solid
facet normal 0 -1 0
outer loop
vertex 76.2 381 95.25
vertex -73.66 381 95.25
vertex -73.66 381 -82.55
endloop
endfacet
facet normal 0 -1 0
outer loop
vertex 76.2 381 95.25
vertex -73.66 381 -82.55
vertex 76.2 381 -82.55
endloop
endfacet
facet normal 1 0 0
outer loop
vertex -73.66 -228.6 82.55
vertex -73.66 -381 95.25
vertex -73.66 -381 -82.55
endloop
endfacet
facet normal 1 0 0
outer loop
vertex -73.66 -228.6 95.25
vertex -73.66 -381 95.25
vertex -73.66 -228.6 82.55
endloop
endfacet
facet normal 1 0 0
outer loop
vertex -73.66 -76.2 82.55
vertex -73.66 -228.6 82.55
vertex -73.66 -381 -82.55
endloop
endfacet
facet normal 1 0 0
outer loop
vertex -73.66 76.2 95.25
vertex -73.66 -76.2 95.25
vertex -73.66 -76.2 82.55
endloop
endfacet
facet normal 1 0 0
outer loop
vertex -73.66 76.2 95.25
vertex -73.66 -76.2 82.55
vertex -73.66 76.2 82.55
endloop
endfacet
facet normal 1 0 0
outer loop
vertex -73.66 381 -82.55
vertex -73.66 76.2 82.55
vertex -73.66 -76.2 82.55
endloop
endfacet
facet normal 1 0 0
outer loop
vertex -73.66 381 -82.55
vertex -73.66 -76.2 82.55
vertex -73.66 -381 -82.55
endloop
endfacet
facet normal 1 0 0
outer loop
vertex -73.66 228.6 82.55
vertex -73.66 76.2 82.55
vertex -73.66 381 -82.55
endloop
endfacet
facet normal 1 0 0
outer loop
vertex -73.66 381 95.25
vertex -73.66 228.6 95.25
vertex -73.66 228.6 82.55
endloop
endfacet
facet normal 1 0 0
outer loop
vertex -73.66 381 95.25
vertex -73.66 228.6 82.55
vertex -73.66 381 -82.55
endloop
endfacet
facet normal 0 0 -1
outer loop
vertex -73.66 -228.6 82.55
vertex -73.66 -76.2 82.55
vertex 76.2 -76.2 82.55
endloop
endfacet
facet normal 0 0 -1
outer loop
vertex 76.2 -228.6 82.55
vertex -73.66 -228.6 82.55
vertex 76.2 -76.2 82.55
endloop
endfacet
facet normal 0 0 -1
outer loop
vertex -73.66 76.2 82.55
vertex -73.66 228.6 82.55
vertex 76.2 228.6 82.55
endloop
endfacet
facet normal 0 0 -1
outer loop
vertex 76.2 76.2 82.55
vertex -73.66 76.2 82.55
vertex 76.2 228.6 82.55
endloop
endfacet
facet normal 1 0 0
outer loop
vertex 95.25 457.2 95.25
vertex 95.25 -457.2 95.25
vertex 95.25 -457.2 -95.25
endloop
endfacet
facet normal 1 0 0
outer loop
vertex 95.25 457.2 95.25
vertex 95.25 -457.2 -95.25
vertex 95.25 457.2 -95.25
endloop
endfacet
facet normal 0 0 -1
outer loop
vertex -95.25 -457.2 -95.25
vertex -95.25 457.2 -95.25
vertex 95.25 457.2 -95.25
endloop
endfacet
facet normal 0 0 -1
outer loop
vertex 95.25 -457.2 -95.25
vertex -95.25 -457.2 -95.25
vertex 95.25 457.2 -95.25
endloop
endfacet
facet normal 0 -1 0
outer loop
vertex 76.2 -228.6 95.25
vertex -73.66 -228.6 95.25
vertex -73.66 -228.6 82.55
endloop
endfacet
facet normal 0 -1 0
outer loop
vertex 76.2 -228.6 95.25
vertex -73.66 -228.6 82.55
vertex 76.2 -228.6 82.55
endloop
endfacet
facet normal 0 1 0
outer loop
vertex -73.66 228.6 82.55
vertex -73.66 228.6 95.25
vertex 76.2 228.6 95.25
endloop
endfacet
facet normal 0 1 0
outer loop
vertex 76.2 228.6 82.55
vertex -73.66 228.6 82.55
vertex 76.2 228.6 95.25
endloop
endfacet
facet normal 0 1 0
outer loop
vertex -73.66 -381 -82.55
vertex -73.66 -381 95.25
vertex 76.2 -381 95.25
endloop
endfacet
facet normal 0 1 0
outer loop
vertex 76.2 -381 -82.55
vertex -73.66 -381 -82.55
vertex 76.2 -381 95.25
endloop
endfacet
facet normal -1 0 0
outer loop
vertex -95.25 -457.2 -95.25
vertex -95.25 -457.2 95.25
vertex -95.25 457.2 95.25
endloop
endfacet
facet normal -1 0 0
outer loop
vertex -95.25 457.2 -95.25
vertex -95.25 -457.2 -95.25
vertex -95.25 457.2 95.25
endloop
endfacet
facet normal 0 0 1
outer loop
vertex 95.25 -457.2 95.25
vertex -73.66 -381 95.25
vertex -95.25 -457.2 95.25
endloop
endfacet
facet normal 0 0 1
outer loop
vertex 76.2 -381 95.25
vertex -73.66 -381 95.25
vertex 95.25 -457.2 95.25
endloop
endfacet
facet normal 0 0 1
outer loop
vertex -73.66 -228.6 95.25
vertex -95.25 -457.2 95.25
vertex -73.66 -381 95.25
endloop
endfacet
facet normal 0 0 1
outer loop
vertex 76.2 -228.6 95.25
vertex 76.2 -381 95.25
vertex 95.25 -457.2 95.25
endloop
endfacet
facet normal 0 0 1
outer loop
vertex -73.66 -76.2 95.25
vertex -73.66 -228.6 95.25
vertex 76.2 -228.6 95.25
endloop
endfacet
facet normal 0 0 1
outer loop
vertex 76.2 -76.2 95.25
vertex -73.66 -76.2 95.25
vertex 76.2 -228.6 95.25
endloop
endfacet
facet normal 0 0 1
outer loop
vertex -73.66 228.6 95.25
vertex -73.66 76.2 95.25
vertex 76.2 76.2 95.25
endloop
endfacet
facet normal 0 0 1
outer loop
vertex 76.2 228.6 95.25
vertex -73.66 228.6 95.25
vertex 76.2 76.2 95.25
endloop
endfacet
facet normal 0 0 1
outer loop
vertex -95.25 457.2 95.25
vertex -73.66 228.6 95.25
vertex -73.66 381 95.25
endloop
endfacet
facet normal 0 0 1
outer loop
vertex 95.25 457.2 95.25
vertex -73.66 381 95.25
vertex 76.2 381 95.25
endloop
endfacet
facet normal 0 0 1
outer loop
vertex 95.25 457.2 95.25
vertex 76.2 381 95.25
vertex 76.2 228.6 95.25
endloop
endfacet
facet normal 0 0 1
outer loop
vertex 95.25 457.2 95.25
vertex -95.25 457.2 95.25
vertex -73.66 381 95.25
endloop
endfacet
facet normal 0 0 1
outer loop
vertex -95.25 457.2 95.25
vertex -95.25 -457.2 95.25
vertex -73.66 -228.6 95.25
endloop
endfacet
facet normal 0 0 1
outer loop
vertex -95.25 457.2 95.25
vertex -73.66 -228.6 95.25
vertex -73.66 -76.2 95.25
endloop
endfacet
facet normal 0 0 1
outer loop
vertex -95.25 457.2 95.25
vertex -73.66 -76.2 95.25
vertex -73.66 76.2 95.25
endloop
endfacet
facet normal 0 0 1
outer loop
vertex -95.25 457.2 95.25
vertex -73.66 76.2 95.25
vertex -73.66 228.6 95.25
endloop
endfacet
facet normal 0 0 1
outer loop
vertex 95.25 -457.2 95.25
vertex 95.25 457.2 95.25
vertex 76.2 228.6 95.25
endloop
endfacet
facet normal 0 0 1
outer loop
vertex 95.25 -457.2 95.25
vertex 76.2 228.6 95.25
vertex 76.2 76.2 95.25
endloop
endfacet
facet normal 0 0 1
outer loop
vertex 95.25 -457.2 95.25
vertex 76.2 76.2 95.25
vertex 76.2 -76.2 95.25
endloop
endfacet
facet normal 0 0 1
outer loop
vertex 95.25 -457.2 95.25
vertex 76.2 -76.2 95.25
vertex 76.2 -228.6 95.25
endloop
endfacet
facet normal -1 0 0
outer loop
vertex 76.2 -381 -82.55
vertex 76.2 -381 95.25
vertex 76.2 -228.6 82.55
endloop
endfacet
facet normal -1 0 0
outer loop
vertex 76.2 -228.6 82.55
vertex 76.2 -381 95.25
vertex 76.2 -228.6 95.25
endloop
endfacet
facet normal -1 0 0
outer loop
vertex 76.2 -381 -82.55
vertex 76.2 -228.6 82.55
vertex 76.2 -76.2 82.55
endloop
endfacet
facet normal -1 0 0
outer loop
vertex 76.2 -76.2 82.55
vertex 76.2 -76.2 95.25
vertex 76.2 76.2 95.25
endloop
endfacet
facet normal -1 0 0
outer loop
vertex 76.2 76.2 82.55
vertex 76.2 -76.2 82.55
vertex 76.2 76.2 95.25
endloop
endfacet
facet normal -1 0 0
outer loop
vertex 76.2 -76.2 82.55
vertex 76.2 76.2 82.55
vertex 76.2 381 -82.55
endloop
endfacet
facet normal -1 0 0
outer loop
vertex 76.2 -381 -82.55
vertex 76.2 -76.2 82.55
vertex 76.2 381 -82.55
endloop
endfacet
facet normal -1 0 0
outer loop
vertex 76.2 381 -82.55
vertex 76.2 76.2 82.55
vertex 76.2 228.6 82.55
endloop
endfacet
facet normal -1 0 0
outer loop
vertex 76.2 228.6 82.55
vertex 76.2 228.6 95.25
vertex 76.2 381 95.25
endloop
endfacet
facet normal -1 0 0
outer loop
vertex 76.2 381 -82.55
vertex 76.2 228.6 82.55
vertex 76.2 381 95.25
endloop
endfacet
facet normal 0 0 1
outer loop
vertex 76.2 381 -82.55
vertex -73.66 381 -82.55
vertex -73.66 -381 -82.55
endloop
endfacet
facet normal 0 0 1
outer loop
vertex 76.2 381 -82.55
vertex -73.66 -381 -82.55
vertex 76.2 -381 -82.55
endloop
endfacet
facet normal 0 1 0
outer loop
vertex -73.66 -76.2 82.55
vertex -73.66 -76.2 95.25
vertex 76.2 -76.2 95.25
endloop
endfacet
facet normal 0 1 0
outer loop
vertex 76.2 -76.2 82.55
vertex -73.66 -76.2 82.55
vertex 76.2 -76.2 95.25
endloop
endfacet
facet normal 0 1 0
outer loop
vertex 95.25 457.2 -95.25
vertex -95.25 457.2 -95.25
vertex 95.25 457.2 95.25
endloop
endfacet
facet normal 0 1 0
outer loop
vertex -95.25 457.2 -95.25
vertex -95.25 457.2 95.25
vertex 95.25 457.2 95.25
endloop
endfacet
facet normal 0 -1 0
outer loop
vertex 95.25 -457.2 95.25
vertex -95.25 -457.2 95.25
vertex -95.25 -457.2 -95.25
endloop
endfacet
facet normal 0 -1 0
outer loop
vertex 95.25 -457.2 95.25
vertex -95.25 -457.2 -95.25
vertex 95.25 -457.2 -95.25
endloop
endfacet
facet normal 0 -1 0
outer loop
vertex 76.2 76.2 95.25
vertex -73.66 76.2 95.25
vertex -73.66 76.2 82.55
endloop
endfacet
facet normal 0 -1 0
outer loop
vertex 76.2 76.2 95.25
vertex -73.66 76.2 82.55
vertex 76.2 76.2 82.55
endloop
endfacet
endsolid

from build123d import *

# Parameters (mm, degrees)
CROQUIS1_W              = 190.5
CROQUIS1_H              = 914.4
SALIENTE_EXTRUIR1_DEPTH = 95.25
CROQUIS2_W              = 149.86
CROQUIS2_H              = 152.4
CORTAR_EXTRUIR1_DEPTH   = 177.8
CORTAR_EXTRUIR3_START   = 152.4
CROQUIS3_W              = 149.86
CROQUIS3_H              = 165.1
CORTAR_EXTRUIR3_DEPTH   = 457.2


with BuildPart() as part:
    # Croquis1 → Saliente-Extruir1 (new body, symmetric)
    with BuildSketch(Plane.XY):
        Rectangle(CROQUIS1_W, CROQUIS1_H)
    extrude(amount=SALIENTE_EXTRUIR1_DEPTH, both=True)

    # Croquis2 → Cortar-Extruir1 (cut)
    with BuildSketch(Plane.XY.offset(95.25)):
        with Locations((1.27, 304.8)):
            Rectangle(CROQUIS2_W, CROQUIS2_H)
        with Locations((1.27, 0)):
            Rectangle(CROQUIS2_W, CROQUIS2_H)
        with Locations((1.27, -304.8)):
            Rectangle(CROQUIS2_W, CROQUIS2_H)
    extrude(amount=-CORTAR_EXTRUIR1_DEPTH, mode=Mode.SUBTRACT)

    # Croquis3 → Cortar-Extruir3 (cut)
    with BuildSketch(Plane.XZ.offset(-381).offset(CORTAR_EXTRUIR3_START)):
        with Locations((1.27, 0)):
            Rectangle(CROQUIS3_W, CROQUIS3_H)
    extrude(amount=CORTAR_EXTRUIR3_DEPTH, mode=Mode.SUBTRACT)


solid = part.part
